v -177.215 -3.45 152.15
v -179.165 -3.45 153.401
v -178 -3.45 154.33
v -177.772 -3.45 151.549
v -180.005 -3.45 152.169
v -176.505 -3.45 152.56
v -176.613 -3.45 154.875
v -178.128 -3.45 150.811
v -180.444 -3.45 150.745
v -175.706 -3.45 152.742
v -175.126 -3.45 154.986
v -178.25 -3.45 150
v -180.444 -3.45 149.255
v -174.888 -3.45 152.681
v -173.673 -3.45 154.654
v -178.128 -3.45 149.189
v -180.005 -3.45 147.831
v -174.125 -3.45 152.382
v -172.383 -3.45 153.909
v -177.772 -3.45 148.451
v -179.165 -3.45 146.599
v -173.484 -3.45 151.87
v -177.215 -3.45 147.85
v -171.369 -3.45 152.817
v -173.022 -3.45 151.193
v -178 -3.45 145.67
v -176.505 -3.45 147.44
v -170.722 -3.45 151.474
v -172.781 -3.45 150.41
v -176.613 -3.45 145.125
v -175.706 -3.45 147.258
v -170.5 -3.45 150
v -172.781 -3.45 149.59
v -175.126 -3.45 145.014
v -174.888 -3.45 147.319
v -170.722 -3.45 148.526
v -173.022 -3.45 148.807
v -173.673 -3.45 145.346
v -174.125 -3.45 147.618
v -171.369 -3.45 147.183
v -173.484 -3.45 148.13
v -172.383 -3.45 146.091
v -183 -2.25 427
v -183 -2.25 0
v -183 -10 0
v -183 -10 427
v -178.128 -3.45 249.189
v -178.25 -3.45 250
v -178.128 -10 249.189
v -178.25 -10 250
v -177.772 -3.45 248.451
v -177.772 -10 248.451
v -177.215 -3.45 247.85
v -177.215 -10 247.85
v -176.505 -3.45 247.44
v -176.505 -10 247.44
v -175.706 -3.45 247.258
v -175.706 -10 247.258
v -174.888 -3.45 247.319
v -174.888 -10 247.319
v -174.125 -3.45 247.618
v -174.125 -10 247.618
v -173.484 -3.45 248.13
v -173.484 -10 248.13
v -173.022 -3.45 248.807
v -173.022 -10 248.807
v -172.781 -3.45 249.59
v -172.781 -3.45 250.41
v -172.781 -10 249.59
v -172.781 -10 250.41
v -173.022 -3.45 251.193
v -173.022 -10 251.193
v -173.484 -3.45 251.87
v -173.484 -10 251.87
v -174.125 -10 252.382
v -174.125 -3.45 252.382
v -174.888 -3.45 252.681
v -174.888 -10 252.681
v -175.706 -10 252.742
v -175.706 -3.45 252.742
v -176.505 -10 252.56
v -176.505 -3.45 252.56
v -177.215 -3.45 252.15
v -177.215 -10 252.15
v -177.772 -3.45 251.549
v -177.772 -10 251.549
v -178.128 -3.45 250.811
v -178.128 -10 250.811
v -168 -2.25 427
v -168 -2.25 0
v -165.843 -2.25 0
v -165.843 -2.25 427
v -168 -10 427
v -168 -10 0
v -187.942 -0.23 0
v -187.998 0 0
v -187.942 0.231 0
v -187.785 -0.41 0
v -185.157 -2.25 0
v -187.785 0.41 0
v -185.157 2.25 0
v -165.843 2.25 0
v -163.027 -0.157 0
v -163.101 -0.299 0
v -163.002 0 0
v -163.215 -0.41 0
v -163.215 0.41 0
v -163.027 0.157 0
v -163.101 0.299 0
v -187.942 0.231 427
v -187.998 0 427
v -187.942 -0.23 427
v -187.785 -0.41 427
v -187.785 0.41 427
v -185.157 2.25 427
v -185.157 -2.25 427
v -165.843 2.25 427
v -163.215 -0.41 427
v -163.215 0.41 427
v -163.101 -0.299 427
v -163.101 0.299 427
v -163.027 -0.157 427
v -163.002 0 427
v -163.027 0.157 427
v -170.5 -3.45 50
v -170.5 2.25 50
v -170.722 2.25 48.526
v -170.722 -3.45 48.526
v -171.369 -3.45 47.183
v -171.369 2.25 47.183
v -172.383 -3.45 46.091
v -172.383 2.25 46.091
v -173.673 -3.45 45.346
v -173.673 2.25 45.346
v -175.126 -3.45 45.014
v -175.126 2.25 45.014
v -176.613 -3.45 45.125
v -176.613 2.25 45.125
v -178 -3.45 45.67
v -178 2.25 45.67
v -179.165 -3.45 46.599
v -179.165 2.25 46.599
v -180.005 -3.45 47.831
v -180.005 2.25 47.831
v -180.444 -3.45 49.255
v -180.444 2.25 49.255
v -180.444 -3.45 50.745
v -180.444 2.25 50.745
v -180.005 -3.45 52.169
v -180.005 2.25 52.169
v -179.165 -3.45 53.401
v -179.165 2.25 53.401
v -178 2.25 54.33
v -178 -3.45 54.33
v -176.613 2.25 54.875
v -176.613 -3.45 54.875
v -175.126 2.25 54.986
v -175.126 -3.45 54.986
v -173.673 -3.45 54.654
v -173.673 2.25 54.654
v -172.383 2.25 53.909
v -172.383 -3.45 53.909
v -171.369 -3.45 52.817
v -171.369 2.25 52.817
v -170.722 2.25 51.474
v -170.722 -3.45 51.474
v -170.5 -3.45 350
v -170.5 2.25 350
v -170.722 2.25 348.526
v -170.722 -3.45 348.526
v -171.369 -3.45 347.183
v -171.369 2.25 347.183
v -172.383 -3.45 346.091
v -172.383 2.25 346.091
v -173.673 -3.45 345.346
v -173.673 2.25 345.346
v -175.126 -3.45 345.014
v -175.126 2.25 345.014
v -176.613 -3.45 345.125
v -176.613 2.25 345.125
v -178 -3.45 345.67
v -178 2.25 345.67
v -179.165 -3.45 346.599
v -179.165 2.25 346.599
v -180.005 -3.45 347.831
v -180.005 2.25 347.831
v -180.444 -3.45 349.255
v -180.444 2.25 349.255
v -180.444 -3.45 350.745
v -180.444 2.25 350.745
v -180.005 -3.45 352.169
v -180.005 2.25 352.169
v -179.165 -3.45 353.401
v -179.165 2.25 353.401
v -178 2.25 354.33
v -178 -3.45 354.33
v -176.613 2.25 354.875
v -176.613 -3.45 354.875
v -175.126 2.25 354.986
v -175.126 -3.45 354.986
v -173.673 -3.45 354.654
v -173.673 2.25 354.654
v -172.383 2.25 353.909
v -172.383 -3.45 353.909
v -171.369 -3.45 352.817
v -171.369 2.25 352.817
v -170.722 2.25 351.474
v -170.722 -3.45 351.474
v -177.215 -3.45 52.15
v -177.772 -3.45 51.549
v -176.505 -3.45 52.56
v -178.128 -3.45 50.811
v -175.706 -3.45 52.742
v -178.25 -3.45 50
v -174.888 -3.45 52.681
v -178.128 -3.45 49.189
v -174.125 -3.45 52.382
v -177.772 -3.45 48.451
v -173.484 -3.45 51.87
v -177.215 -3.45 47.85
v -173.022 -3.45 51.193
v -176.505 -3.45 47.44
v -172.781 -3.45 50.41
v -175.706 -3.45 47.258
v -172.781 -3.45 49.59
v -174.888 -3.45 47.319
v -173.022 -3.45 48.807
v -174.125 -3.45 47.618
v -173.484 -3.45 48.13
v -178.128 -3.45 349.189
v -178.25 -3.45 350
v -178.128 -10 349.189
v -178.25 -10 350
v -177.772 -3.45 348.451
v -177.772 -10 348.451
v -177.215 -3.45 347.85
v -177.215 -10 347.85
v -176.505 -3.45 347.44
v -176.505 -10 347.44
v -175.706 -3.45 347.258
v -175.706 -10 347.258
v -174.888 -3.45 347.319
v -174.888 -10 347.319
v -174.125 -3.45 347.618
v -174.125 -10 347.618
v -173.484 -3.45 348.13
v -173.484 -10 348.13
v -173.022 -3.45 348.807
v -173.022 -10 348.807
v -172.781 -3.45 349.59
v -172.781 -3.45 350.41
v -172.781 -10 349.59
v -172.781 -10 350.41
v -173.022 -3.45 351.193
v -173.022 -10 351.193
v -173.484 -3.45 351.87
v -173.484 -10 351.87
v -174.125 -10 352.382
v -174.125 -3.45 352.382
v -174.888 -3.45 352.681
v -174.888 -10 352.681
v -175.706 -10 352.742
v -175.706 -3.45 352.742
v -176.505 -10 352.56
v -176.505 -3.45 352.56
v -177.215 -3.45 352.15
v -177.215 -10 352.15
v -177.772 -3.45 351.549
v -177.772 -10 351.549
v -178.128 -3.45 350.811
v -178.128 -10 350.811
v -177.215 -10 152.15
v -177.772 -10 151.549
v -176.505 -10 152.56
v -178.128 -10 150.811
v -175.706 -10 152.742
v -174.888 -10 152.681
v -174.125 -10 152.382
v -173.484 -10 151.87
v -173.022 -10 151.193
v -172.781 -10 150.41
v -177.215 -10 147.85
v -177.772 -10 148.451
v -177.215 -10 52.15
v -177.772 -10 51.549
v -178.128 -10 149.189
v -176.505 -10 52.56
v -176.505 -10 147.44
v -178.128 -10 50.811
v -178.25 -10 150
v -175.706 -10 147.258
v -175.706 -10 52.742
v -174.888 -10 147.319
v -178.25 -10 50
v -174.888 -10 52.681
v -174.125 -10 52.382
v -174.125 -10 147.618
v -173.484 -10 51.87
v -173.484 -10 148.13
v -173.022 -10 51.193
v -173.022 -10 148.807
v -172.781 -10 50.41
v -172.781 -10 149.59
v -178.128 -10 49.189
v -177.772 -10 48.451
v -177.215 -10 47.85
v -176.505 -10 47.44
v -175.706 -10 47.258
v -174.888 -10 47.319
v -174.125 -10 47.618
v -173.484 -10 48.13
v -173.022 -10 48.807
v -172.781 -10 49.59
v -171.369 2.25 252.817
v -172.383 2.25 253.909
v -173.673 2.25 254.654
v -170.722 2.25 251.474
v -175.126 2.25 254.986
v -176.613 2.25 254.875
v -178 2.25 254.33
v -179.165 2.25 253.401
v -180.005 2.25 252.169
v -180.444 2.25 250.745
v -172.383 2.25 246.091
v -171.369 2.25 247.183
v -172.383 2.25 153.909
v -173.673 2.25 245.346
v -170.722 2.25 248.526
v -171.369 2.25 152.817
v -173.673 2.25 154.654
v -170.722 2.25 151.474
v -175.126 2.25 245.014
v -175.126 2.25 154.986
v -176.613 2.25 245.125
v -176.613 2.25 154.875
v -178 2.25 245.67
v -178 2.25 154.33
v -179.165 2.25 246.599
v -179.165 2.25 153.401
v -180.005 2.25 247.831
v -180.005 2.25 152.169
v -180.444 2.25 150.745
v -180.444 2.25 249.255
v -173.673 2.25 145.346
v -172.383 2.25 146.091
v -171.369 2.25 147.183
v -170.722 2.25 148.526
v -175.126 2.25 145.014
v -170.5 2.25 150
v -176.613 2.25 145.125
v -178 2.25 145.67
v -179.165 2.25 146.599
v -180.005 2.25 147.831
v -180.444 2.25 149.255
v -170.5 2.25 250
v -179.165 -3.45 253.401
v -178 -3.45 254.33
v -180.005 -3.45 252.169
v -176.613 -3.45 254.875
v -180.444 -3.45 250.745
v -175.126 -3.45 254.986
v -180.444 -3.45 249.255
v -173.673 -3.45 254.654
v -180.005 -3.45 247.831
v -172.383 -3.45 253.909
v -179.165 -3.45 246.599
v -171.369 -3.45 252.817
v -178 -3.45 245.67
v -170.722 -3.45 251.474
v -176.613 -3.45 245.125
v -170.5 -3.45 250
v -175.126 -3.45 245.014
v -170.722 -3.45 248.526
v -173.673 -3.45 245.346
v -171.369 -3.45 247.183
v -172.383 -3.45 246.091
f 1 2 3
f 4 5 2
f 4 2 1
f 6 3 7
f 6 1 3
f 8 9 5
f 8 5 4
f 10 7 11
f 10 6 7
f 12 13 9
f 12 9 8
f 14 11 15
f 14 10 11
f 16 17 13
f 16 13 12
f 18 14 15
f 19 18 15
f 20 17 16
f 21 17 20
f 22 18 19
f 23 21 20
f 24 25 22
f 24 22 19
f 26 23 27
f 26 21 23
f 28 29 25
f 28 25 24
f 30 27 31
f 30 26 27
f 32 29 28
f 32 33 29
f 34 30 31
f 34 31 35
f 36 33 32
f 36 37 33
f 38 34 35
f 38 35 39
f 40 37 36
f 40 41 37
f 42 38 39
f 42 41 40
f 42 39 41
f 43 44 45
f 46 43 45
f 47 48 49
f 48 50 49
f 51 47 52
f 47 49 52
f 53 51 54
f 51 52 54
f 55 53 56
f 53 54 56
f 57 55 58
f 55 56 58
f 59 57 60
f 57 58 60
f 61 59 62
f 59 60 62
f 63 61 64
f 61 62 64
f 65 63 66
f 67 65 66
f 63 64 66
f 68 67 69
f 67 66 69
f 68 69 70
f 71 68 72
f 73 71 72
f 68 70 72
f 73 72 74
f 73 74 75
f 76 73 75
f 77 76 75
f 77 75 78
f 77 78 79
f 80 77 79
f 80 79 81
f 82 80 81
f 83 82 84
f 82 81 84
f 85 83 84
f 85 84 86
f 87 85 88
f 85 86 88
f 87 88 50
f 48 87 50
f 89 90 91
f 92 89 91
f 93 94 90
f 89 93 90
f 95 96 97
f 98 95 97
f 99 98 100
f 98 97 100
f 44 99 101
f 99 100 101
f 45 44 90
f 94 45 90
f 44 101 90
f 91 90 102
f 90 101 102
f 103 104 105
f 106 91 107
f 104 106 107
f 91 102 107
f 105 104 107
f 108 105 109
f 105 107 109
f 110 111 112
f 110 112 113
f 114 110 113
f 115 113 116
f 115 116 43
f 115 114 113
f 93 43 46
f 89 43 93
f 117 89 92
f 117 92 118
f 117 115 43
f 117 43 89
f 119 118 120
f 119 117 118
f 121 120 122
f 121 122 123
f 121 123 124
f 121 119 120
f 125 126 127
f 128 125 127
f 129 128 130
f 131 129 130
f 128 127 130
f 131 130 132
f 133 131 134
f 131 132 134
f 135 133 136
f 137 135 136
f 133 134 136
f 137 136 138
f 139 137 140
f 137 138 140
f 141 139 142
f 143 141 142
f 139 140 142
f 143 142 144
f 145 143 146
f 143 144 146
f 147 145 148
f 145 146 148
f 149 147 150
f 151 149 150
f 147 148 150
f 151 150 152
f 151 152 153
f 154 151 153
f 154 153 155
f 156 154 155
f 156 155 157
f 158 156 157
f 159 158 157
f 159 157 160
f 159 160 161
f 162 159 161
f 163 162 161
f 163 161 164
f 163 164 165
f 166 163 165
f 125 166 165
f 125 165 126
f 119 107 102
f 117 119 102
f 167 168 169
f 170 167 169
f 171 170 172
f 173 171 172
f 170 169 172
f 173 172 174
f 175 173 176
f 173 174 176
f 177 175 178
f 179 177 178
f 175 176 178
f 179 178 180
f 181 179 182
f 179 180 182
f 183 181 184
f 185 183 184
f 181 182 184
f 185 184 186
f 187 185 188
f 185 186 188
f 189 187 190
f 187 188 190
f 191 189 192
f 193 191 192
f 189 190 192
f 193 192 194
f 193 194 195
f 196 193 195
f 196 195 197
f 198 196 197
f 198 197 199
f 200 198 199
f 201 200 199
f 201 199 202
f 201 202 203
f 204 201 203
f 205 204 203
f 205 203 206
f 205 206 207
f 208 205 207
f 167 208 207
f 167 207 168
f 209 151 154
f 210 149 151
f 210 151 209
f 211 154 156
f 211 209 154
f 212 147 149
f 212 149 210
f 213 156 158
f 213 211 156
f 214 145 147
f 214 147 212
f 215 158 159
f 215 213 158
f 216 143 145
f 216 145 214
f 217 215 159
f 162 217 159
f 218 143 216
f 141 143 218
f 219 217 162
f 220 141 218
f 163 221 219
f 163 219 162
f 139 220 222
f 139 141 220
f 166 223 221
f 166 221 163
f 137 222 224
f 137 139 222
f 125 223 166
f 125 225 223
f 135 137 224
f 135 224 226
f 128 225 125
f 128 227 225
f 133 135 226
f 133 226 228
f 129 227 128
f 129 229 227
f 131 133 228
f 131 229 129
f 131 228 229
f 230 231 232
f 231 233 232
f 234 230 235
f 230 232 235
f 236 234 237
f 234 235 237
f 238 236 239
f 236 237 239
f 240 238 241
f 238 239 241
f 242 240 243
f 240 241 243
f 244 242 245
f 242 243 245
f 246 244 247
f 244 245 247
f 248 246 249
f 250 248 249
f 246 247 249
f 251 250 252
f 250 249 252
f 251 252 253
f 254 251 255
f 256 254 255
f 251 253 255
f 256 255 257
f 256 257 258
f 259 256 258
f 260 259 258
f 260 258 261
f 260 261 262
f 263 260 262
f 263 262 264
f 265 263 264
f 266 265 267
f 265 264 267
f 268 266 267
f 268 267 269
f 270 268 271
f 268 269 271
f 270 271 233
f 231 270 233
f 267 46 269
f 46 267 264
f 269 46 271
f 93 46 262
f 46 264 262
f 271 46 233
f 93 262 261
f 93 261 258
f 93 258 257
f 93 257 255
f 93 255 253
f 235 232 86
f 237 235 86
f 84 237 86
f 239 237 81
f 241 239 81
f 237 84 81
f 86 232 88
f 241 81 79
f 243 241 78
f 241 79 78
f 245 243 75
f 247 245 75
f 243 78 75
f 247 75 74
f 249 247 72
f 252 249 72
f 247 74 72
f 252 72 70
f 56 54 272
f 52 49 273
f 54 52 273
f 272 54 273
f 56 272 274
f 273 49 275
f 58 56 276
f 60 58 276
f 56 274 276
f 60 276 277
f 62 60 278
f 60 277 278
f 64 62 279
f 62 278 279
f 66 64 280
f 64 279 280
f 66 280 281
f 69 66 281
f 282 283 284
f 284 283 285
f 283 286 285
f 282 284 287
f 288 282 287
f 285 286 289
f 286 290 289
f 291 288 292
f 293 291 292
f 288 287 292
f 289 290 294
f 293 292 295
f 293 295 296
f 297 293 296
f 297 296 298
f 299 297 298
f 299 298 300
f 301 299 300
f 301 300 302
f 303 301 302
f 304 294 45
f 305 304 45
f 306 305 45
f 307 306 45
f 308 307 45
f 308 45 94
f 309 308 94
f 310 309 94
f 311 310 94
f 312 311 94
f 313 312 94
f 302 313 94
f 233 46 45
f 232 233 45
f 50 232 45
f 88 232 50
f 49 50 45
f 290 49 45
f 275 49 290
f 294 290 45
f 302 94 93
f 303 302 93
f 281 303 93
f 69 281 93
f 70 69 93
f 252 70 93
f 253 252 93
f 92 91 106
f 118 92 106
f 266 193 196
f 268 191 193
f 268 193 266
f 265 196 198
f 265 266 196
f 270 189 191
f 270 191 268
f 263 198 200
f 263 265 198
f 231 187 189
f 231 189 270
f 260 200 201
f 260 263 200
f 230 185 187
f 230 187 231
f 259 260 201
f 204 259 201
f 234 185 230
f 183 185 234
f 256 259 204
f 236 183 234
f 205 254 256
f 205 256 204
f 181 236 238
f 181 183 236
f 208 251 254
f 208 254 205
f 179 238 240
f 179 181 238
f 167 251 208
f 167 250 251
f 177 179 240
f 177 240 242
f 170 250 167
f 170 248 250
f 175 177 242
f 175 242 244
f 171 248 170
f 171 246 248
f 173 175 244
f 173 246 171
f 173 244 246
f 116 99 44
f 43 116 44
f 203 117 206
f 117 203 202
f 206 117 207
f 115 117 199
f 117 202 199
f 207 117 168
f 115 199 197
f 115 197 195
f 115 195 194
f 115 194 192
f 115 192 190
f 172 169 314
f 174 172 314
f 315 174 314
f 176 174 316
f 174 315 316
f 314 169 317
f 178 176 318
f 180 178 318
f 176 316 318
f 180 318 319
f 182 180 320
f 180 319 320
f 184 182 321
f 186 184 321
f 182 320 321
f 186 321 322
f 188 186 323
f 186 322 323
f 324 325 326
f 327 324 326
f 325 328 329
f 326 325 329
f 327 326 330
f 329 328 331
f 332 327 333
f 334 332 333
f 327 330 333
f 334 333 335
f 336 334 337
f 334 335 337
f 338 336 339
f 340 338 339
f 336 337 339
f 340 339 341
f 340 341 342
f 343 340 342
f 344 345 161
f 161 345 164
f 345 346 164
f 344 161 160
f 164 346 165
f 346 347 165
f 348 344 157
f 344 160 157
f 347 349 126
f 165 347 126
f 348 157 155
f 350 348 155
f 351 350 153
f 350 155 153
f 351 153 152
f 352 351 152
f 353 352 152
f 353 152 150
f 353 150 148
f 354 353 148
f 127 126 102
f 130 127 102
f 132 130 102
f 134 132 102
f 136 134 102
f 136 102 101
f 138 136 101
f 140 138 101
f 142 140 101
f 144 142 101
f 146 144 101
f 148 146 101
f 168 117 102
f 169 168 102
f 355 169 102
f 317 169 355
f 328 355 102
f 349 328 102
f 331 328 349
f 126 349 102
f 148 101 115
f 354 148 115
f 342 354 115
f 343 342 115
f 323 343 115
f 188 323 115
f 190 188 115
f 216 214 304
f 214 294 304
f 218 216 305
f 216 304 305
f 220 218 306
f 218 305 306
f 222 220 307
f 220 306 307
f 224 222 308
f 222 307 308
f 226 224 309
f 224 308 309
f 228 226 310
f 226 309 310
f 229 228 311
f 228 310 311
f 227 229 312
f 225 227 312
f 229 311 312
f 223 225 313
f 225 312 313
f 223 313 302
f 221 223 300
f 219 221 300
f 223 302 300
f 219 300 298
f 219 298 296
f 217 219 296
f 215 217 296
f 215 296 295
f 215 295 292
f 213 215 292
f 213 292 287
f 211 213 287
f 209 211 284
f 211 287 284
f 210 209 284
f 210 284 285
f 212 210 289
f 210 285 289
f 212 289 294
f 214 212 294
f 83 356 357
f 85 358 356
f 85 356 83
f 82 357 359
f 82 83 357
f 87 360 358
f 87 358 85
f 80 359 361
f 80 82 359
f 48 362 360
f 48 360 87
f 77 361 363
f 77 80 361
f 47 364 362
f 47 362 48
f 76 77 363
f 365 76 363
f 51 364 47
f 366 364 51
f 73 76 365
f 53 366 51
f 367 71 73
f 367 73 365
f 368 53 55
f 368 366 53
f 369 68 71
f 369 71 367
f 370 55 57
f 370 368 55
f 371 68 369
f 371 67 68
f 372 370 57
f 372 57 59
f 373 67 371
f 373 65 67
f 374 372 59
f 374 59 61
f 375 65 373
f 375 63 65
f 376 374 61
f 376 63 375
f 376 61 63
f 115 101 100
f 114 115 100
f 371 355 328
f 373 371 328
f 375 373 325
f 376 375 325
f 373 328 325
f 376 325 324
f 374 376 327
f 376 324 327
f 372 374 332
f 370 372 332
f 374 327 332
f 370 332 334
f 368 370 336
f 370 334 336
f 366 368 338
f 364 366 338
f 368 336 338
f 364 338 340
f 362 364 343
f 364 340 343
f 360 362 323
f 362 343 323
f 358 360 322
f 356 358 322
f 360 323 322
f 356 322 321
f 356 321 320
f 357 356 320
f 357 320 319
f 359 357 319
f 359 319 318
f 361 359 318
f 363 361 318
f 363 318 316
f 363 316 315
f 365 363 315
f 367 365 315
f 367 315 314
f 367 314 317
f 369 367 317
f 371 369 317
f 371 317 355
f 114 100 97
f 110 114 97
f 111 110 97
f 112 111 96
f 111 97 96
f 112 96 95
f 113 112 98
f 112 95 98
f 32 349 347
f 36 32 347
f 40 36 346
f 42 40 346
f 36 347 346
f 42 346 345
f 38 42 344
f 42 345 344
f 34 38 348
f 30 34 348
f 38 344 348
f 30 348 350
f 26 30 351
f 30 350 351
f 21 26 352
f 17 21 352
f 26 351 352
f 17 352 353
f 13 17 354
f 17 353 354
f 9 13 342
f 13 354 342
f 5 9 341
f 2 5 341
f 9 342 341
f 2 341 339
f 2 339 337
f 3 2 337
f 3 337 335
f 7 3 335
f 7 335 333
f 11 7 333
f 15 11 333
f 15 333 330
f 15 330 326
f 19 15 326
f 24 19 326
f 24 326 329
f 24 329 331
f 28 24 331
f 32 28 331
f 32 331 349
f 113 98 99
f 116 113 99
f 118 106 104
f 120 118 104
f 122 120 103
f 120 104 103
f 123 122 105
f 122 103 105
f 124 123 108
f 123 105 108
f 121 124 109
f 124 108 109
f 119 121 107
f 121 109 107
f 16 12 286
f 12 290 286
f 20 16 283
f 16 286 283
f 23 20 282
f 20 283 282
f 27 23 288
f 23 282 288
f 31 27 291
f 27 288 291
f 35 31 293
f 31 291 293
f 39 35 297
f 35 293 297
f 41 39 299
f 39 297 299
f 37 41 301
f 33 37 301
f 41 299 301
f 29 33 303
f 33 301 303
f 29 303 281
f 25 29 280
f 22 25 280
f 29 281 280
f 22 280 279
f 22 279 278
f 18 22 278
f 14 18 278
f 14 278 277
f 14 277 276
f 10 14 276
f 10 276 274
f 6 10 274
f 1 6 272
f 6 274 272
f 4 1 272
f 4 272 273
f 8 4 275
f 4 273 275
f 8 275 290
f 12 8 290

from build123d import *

# Parameters (mm, degrees)
SKETCH_2_R                   = 183
EXTRUDE_1_DEPTH              = 7.75
HOLE_WIZARD_M5_1_D           = 5.5
HOLE_WIZARD_M5_1_CBORE_D     = 9
HOLE_WIZARD_M5_1_CBORE_DEPTH = 6
SKETCH_6_W                   = 499.91157149
SKETCH_6_H                   = 215.35218654
CUT_EXTRUDE_1_DEPTH          = 267.151754372
EXTRUDE_2_DEPTH              = 427
SKETCH_8_W                   = 538.874028387
SKETCH_8_H                   = 388.77669628
CUT_EXTRUDE_2_DEPTH          = 467.660847956
HOLE_WIZARD_1_D              = 5.5
HOLE_WIZARD_1_CBORE_D        = 10
HOLE_WIZARD_1_CBORE_DEPTH    = 5.7


with BuildPart() as part:
    # 草图1 → 旋转1 (revolve)
    with BuildSketch(Plane.XY, mode=Mode.PRIVATE) as revolve_1_sk:
        with BuildLine():
            Line((185.156666985, 2.25), (0, 2.25))
            Line((0, 2.25), (0, -2.25))
            Line((0, -2.25), (185.156666985, -2.25))
            Line((185.156666985, -2.25), (187.78506482, -0.409576022))
            add(Edge.make_bspline(
                [(187.78506482, 0.409576022), (187.830906121, 0.377477598), (187.871837762, 0.337021948), (187.904470176, 0.291559224), (187.937102589, 0.246096499), (187.962335818, 0.194372782), (187.978080287, 0.140671335), (187.993824756, 0.086969887), (188.000514717, 0.029809558), (187.997596172, -0.026076181), (187.994677627, -0.08196192), (187.982070079, -0.138114466), (187.960817564, -0.189883804), (187.939565048, -0.241653142), (187.909081396, -0.290467133), (187.87189097, -0.332283469), (187.846140091, -0.361237358), (187.816805619, -0.387350876), (187.78506482, -0.409576022)],
                knots=[0, 0, 0, 0, 0.000167886, 0.000167886, 0.000167886, 0.000335771, 0.000335771, 0.000335771, 0.000503657, 0.000503657, 0.000503657, 0.000671543, 0.000671543, 0.000671543, 0.000839428, 0.000839428, 0.000839428, 0.000954806, 0.000954806, 0.000954806, 0.000954806], degree=3))
            Line((187.78506482, 0.409576022), (185.156666985, 2.25))
        make_face()
    revolve(revolve_1_sk.sketch.rotate(Axis((0, 2.25, 0), (0, -1, 0)), 270), axis=Axis((0, 2.25, 0), (0, -1, 0)))

    # 草图2 → 凸台-拉伸1 (add)
    with BuildSketch(Plane.XZ.offset(2.25)):
        with Locations(Location((0, 0, 0), (0, 0, 270))):
            Circle(SKETCH_2_R)
    extrude(amount=EXTRUDE_1_DEPTH)

    # 草图3 → 切除-旋转1 (revolve, cut)
    with BuildSketch(Plane.XY, mode=Mode.PRIVATE) as cut_revolve_1_sk:
        with BuildLine():
            Line((165.843333015, 2.25), (0, 2.25))
            Line((0, 2.25), (0, -10))
            Line((0, -10), (168, -10))
            Line((168, -10), (168, -2.25))
            Line((168, -2.25), (165.843333015, -2.25))
            Line((165.843333015, -2.25), (163.21493518, -0.409576022))
            ThreePointArc((163.21493518, -0.409576022), (163.001723398, 0), (163.21493518, 0.409576022))
            Line((163.21493518, 0.409576022), (165.843333015, 2.25))
        make_face()
    revolve(cut_revolve_1_sk.sketch.rotate(Axis((0, 2.25, 0), (0, -1, 0)), 270), axis=Axis((0, 2.25, 0), (0, -1, 0)), mode=Mode.SUBTRACT)

    # M5 六角头螺栓的柱形沉头孔1 (through all)
    with Locations(Plane(origin=(0, 2.25, 0), x_dir=(1, 0, 0), z_dir=(0, 1, 0))):
        with Locations((-45.422742415, -169.519982514), (-124.097240098, -124.097240098), (-169.519982514, -45.422742415), (45.422742415, -169.519982514), (124.097240098, -124.097240098), (169.519982514, -45.422742415), (-45.422742415, 169.519982514), (-124.097240098, 124.097240098), (-169.519982514, 45.422742415), (45.422742415, 169.519982514), (124.097240098, 124.097240098), (169.519982514, 45.422742415)):
            CounterBoreHole(HOLE_WIZARD_M5_1_D / 2, HOLE_WIZARD_M5_1_CBORE_D / 2, HOLE_WIZARD_M5_1_CBORE_DEPTH)

    # 草图6 → 切除-拉伸1 (cut, through all)
    with BuildSketch(Plane(origin=(0, 2.25, 0), x_dir=(1, 0, 0), z_dir=(0, 1, 0))):
        with Locations((-5.153727541, -107.67609327)):
            Rectangle(SKETCH_6_W, SKETCH_6_H)
    extrude(amount=-CUT_EXTRUDE_1_DEPTH, mode=Mode.SUBTRACT)

    # 草图7 → 凸台-拉伸2 (add)
    with BuildSketch(Plane.XY):
        with BuildLine():
            Line((-185.156666985, 2.25), (-187.78506482, 0.409576022))
            add(Edge.make_bspline(
                [(-187.78506482, 0.409576022), (-187.830906121, 0.377477598), (-187.871837762, 0.337021948), (-187.904470176, 0.291559224), (-187.937102589, 0.246096499), (-187.962335818, 0.194372782), (-187.978080287, 0.140671335), (-187.993824756, 0.086969887), (-188.000514717, 0.029809558), (-187.997596172, -0.026076181), (-187.994677627, -0.08196192), (-187.982070079, -0.138114466), (-187.960817564, -0.189883804), (-187.939565048, -0.241653142), (-187.909081396, -0.290467133), (-187.87189097, -0.332283469), (-187.846140091, -0.361237358), (-187.816805619, -0.387350876), (-187.78506482, -0.409576022)],
                knots=[0, 0, 0, 0, 0.000167886, 0.000167886, 0.000167886, 0.000335771, 0.000335771, 0.000335771, 0.000503657, 0.000503657, 0.000503657, 0.000671543, 0.000671543, 0.000671543, 0.000839428, 0.000839428, 0.000839428, 0.000954806, 0.000954806, 0.000954806, 0.000954806], degree=3))
            Line((-187.78506482, -0.409576022), (-185.156666985, -2.25))
            Line((-185.156666985, -2.25), (-183, -2.25))
            Line((-183, -2.25), (-183, -10))
            Line((-183, -10), (-168, -10))
            Line((-168, -10), (-168, -2.25))
            Line((-168, -2.25), (-165.843333015, -2.25))
            Line((-165.843333015, -2.25), (-163.21493518, -0.409576022))
            ThreePointArc((-163.21493518, -0.409576022), (-163.001723398, 0), (-163.21493518, 0.409576022))
            Line((-163.21493518, 0.409576022), (-165.843333015, 2.25))
            Line((-165.843333015, 2.25), (-185.156666985, 2.25))
        make_face()
    extrude(amount=EXTRUDE_2_DEPTH)

    # 草图8 → 切除-拉伸2 (cut, through all)
    with BuildSketch(Plane.XY):
        with Locations((39.369792029, -22.329590013)):
            Rectangle(SKETCH_8_W, SKETCH_8_H)
    extrude(amount=-CUT_EXTRUDE_2_DEPTH, mode=Mode.SUBTRACT)

    # 打孔尺寸(%根据)内六角圆柱头螺钉的类型1 (through all)
    with Locations(Plane(origin=(0, 2.25, 0), x_dir=(1, 0, 0), z_dir=(0, 1, 0))):
        with Locations((-175.5, -50), (-175.5, -450), (-175.5, -150), (-175.5, -350), (-175.5, -250)):
            CounterBoreHole(HOLE_WIZARD_1_D / 2, HOLE_WIZARD_1_CBORE_D / 2, HOLE_WIZARD_1_CBORE_DEPTH)


solid = part.part
